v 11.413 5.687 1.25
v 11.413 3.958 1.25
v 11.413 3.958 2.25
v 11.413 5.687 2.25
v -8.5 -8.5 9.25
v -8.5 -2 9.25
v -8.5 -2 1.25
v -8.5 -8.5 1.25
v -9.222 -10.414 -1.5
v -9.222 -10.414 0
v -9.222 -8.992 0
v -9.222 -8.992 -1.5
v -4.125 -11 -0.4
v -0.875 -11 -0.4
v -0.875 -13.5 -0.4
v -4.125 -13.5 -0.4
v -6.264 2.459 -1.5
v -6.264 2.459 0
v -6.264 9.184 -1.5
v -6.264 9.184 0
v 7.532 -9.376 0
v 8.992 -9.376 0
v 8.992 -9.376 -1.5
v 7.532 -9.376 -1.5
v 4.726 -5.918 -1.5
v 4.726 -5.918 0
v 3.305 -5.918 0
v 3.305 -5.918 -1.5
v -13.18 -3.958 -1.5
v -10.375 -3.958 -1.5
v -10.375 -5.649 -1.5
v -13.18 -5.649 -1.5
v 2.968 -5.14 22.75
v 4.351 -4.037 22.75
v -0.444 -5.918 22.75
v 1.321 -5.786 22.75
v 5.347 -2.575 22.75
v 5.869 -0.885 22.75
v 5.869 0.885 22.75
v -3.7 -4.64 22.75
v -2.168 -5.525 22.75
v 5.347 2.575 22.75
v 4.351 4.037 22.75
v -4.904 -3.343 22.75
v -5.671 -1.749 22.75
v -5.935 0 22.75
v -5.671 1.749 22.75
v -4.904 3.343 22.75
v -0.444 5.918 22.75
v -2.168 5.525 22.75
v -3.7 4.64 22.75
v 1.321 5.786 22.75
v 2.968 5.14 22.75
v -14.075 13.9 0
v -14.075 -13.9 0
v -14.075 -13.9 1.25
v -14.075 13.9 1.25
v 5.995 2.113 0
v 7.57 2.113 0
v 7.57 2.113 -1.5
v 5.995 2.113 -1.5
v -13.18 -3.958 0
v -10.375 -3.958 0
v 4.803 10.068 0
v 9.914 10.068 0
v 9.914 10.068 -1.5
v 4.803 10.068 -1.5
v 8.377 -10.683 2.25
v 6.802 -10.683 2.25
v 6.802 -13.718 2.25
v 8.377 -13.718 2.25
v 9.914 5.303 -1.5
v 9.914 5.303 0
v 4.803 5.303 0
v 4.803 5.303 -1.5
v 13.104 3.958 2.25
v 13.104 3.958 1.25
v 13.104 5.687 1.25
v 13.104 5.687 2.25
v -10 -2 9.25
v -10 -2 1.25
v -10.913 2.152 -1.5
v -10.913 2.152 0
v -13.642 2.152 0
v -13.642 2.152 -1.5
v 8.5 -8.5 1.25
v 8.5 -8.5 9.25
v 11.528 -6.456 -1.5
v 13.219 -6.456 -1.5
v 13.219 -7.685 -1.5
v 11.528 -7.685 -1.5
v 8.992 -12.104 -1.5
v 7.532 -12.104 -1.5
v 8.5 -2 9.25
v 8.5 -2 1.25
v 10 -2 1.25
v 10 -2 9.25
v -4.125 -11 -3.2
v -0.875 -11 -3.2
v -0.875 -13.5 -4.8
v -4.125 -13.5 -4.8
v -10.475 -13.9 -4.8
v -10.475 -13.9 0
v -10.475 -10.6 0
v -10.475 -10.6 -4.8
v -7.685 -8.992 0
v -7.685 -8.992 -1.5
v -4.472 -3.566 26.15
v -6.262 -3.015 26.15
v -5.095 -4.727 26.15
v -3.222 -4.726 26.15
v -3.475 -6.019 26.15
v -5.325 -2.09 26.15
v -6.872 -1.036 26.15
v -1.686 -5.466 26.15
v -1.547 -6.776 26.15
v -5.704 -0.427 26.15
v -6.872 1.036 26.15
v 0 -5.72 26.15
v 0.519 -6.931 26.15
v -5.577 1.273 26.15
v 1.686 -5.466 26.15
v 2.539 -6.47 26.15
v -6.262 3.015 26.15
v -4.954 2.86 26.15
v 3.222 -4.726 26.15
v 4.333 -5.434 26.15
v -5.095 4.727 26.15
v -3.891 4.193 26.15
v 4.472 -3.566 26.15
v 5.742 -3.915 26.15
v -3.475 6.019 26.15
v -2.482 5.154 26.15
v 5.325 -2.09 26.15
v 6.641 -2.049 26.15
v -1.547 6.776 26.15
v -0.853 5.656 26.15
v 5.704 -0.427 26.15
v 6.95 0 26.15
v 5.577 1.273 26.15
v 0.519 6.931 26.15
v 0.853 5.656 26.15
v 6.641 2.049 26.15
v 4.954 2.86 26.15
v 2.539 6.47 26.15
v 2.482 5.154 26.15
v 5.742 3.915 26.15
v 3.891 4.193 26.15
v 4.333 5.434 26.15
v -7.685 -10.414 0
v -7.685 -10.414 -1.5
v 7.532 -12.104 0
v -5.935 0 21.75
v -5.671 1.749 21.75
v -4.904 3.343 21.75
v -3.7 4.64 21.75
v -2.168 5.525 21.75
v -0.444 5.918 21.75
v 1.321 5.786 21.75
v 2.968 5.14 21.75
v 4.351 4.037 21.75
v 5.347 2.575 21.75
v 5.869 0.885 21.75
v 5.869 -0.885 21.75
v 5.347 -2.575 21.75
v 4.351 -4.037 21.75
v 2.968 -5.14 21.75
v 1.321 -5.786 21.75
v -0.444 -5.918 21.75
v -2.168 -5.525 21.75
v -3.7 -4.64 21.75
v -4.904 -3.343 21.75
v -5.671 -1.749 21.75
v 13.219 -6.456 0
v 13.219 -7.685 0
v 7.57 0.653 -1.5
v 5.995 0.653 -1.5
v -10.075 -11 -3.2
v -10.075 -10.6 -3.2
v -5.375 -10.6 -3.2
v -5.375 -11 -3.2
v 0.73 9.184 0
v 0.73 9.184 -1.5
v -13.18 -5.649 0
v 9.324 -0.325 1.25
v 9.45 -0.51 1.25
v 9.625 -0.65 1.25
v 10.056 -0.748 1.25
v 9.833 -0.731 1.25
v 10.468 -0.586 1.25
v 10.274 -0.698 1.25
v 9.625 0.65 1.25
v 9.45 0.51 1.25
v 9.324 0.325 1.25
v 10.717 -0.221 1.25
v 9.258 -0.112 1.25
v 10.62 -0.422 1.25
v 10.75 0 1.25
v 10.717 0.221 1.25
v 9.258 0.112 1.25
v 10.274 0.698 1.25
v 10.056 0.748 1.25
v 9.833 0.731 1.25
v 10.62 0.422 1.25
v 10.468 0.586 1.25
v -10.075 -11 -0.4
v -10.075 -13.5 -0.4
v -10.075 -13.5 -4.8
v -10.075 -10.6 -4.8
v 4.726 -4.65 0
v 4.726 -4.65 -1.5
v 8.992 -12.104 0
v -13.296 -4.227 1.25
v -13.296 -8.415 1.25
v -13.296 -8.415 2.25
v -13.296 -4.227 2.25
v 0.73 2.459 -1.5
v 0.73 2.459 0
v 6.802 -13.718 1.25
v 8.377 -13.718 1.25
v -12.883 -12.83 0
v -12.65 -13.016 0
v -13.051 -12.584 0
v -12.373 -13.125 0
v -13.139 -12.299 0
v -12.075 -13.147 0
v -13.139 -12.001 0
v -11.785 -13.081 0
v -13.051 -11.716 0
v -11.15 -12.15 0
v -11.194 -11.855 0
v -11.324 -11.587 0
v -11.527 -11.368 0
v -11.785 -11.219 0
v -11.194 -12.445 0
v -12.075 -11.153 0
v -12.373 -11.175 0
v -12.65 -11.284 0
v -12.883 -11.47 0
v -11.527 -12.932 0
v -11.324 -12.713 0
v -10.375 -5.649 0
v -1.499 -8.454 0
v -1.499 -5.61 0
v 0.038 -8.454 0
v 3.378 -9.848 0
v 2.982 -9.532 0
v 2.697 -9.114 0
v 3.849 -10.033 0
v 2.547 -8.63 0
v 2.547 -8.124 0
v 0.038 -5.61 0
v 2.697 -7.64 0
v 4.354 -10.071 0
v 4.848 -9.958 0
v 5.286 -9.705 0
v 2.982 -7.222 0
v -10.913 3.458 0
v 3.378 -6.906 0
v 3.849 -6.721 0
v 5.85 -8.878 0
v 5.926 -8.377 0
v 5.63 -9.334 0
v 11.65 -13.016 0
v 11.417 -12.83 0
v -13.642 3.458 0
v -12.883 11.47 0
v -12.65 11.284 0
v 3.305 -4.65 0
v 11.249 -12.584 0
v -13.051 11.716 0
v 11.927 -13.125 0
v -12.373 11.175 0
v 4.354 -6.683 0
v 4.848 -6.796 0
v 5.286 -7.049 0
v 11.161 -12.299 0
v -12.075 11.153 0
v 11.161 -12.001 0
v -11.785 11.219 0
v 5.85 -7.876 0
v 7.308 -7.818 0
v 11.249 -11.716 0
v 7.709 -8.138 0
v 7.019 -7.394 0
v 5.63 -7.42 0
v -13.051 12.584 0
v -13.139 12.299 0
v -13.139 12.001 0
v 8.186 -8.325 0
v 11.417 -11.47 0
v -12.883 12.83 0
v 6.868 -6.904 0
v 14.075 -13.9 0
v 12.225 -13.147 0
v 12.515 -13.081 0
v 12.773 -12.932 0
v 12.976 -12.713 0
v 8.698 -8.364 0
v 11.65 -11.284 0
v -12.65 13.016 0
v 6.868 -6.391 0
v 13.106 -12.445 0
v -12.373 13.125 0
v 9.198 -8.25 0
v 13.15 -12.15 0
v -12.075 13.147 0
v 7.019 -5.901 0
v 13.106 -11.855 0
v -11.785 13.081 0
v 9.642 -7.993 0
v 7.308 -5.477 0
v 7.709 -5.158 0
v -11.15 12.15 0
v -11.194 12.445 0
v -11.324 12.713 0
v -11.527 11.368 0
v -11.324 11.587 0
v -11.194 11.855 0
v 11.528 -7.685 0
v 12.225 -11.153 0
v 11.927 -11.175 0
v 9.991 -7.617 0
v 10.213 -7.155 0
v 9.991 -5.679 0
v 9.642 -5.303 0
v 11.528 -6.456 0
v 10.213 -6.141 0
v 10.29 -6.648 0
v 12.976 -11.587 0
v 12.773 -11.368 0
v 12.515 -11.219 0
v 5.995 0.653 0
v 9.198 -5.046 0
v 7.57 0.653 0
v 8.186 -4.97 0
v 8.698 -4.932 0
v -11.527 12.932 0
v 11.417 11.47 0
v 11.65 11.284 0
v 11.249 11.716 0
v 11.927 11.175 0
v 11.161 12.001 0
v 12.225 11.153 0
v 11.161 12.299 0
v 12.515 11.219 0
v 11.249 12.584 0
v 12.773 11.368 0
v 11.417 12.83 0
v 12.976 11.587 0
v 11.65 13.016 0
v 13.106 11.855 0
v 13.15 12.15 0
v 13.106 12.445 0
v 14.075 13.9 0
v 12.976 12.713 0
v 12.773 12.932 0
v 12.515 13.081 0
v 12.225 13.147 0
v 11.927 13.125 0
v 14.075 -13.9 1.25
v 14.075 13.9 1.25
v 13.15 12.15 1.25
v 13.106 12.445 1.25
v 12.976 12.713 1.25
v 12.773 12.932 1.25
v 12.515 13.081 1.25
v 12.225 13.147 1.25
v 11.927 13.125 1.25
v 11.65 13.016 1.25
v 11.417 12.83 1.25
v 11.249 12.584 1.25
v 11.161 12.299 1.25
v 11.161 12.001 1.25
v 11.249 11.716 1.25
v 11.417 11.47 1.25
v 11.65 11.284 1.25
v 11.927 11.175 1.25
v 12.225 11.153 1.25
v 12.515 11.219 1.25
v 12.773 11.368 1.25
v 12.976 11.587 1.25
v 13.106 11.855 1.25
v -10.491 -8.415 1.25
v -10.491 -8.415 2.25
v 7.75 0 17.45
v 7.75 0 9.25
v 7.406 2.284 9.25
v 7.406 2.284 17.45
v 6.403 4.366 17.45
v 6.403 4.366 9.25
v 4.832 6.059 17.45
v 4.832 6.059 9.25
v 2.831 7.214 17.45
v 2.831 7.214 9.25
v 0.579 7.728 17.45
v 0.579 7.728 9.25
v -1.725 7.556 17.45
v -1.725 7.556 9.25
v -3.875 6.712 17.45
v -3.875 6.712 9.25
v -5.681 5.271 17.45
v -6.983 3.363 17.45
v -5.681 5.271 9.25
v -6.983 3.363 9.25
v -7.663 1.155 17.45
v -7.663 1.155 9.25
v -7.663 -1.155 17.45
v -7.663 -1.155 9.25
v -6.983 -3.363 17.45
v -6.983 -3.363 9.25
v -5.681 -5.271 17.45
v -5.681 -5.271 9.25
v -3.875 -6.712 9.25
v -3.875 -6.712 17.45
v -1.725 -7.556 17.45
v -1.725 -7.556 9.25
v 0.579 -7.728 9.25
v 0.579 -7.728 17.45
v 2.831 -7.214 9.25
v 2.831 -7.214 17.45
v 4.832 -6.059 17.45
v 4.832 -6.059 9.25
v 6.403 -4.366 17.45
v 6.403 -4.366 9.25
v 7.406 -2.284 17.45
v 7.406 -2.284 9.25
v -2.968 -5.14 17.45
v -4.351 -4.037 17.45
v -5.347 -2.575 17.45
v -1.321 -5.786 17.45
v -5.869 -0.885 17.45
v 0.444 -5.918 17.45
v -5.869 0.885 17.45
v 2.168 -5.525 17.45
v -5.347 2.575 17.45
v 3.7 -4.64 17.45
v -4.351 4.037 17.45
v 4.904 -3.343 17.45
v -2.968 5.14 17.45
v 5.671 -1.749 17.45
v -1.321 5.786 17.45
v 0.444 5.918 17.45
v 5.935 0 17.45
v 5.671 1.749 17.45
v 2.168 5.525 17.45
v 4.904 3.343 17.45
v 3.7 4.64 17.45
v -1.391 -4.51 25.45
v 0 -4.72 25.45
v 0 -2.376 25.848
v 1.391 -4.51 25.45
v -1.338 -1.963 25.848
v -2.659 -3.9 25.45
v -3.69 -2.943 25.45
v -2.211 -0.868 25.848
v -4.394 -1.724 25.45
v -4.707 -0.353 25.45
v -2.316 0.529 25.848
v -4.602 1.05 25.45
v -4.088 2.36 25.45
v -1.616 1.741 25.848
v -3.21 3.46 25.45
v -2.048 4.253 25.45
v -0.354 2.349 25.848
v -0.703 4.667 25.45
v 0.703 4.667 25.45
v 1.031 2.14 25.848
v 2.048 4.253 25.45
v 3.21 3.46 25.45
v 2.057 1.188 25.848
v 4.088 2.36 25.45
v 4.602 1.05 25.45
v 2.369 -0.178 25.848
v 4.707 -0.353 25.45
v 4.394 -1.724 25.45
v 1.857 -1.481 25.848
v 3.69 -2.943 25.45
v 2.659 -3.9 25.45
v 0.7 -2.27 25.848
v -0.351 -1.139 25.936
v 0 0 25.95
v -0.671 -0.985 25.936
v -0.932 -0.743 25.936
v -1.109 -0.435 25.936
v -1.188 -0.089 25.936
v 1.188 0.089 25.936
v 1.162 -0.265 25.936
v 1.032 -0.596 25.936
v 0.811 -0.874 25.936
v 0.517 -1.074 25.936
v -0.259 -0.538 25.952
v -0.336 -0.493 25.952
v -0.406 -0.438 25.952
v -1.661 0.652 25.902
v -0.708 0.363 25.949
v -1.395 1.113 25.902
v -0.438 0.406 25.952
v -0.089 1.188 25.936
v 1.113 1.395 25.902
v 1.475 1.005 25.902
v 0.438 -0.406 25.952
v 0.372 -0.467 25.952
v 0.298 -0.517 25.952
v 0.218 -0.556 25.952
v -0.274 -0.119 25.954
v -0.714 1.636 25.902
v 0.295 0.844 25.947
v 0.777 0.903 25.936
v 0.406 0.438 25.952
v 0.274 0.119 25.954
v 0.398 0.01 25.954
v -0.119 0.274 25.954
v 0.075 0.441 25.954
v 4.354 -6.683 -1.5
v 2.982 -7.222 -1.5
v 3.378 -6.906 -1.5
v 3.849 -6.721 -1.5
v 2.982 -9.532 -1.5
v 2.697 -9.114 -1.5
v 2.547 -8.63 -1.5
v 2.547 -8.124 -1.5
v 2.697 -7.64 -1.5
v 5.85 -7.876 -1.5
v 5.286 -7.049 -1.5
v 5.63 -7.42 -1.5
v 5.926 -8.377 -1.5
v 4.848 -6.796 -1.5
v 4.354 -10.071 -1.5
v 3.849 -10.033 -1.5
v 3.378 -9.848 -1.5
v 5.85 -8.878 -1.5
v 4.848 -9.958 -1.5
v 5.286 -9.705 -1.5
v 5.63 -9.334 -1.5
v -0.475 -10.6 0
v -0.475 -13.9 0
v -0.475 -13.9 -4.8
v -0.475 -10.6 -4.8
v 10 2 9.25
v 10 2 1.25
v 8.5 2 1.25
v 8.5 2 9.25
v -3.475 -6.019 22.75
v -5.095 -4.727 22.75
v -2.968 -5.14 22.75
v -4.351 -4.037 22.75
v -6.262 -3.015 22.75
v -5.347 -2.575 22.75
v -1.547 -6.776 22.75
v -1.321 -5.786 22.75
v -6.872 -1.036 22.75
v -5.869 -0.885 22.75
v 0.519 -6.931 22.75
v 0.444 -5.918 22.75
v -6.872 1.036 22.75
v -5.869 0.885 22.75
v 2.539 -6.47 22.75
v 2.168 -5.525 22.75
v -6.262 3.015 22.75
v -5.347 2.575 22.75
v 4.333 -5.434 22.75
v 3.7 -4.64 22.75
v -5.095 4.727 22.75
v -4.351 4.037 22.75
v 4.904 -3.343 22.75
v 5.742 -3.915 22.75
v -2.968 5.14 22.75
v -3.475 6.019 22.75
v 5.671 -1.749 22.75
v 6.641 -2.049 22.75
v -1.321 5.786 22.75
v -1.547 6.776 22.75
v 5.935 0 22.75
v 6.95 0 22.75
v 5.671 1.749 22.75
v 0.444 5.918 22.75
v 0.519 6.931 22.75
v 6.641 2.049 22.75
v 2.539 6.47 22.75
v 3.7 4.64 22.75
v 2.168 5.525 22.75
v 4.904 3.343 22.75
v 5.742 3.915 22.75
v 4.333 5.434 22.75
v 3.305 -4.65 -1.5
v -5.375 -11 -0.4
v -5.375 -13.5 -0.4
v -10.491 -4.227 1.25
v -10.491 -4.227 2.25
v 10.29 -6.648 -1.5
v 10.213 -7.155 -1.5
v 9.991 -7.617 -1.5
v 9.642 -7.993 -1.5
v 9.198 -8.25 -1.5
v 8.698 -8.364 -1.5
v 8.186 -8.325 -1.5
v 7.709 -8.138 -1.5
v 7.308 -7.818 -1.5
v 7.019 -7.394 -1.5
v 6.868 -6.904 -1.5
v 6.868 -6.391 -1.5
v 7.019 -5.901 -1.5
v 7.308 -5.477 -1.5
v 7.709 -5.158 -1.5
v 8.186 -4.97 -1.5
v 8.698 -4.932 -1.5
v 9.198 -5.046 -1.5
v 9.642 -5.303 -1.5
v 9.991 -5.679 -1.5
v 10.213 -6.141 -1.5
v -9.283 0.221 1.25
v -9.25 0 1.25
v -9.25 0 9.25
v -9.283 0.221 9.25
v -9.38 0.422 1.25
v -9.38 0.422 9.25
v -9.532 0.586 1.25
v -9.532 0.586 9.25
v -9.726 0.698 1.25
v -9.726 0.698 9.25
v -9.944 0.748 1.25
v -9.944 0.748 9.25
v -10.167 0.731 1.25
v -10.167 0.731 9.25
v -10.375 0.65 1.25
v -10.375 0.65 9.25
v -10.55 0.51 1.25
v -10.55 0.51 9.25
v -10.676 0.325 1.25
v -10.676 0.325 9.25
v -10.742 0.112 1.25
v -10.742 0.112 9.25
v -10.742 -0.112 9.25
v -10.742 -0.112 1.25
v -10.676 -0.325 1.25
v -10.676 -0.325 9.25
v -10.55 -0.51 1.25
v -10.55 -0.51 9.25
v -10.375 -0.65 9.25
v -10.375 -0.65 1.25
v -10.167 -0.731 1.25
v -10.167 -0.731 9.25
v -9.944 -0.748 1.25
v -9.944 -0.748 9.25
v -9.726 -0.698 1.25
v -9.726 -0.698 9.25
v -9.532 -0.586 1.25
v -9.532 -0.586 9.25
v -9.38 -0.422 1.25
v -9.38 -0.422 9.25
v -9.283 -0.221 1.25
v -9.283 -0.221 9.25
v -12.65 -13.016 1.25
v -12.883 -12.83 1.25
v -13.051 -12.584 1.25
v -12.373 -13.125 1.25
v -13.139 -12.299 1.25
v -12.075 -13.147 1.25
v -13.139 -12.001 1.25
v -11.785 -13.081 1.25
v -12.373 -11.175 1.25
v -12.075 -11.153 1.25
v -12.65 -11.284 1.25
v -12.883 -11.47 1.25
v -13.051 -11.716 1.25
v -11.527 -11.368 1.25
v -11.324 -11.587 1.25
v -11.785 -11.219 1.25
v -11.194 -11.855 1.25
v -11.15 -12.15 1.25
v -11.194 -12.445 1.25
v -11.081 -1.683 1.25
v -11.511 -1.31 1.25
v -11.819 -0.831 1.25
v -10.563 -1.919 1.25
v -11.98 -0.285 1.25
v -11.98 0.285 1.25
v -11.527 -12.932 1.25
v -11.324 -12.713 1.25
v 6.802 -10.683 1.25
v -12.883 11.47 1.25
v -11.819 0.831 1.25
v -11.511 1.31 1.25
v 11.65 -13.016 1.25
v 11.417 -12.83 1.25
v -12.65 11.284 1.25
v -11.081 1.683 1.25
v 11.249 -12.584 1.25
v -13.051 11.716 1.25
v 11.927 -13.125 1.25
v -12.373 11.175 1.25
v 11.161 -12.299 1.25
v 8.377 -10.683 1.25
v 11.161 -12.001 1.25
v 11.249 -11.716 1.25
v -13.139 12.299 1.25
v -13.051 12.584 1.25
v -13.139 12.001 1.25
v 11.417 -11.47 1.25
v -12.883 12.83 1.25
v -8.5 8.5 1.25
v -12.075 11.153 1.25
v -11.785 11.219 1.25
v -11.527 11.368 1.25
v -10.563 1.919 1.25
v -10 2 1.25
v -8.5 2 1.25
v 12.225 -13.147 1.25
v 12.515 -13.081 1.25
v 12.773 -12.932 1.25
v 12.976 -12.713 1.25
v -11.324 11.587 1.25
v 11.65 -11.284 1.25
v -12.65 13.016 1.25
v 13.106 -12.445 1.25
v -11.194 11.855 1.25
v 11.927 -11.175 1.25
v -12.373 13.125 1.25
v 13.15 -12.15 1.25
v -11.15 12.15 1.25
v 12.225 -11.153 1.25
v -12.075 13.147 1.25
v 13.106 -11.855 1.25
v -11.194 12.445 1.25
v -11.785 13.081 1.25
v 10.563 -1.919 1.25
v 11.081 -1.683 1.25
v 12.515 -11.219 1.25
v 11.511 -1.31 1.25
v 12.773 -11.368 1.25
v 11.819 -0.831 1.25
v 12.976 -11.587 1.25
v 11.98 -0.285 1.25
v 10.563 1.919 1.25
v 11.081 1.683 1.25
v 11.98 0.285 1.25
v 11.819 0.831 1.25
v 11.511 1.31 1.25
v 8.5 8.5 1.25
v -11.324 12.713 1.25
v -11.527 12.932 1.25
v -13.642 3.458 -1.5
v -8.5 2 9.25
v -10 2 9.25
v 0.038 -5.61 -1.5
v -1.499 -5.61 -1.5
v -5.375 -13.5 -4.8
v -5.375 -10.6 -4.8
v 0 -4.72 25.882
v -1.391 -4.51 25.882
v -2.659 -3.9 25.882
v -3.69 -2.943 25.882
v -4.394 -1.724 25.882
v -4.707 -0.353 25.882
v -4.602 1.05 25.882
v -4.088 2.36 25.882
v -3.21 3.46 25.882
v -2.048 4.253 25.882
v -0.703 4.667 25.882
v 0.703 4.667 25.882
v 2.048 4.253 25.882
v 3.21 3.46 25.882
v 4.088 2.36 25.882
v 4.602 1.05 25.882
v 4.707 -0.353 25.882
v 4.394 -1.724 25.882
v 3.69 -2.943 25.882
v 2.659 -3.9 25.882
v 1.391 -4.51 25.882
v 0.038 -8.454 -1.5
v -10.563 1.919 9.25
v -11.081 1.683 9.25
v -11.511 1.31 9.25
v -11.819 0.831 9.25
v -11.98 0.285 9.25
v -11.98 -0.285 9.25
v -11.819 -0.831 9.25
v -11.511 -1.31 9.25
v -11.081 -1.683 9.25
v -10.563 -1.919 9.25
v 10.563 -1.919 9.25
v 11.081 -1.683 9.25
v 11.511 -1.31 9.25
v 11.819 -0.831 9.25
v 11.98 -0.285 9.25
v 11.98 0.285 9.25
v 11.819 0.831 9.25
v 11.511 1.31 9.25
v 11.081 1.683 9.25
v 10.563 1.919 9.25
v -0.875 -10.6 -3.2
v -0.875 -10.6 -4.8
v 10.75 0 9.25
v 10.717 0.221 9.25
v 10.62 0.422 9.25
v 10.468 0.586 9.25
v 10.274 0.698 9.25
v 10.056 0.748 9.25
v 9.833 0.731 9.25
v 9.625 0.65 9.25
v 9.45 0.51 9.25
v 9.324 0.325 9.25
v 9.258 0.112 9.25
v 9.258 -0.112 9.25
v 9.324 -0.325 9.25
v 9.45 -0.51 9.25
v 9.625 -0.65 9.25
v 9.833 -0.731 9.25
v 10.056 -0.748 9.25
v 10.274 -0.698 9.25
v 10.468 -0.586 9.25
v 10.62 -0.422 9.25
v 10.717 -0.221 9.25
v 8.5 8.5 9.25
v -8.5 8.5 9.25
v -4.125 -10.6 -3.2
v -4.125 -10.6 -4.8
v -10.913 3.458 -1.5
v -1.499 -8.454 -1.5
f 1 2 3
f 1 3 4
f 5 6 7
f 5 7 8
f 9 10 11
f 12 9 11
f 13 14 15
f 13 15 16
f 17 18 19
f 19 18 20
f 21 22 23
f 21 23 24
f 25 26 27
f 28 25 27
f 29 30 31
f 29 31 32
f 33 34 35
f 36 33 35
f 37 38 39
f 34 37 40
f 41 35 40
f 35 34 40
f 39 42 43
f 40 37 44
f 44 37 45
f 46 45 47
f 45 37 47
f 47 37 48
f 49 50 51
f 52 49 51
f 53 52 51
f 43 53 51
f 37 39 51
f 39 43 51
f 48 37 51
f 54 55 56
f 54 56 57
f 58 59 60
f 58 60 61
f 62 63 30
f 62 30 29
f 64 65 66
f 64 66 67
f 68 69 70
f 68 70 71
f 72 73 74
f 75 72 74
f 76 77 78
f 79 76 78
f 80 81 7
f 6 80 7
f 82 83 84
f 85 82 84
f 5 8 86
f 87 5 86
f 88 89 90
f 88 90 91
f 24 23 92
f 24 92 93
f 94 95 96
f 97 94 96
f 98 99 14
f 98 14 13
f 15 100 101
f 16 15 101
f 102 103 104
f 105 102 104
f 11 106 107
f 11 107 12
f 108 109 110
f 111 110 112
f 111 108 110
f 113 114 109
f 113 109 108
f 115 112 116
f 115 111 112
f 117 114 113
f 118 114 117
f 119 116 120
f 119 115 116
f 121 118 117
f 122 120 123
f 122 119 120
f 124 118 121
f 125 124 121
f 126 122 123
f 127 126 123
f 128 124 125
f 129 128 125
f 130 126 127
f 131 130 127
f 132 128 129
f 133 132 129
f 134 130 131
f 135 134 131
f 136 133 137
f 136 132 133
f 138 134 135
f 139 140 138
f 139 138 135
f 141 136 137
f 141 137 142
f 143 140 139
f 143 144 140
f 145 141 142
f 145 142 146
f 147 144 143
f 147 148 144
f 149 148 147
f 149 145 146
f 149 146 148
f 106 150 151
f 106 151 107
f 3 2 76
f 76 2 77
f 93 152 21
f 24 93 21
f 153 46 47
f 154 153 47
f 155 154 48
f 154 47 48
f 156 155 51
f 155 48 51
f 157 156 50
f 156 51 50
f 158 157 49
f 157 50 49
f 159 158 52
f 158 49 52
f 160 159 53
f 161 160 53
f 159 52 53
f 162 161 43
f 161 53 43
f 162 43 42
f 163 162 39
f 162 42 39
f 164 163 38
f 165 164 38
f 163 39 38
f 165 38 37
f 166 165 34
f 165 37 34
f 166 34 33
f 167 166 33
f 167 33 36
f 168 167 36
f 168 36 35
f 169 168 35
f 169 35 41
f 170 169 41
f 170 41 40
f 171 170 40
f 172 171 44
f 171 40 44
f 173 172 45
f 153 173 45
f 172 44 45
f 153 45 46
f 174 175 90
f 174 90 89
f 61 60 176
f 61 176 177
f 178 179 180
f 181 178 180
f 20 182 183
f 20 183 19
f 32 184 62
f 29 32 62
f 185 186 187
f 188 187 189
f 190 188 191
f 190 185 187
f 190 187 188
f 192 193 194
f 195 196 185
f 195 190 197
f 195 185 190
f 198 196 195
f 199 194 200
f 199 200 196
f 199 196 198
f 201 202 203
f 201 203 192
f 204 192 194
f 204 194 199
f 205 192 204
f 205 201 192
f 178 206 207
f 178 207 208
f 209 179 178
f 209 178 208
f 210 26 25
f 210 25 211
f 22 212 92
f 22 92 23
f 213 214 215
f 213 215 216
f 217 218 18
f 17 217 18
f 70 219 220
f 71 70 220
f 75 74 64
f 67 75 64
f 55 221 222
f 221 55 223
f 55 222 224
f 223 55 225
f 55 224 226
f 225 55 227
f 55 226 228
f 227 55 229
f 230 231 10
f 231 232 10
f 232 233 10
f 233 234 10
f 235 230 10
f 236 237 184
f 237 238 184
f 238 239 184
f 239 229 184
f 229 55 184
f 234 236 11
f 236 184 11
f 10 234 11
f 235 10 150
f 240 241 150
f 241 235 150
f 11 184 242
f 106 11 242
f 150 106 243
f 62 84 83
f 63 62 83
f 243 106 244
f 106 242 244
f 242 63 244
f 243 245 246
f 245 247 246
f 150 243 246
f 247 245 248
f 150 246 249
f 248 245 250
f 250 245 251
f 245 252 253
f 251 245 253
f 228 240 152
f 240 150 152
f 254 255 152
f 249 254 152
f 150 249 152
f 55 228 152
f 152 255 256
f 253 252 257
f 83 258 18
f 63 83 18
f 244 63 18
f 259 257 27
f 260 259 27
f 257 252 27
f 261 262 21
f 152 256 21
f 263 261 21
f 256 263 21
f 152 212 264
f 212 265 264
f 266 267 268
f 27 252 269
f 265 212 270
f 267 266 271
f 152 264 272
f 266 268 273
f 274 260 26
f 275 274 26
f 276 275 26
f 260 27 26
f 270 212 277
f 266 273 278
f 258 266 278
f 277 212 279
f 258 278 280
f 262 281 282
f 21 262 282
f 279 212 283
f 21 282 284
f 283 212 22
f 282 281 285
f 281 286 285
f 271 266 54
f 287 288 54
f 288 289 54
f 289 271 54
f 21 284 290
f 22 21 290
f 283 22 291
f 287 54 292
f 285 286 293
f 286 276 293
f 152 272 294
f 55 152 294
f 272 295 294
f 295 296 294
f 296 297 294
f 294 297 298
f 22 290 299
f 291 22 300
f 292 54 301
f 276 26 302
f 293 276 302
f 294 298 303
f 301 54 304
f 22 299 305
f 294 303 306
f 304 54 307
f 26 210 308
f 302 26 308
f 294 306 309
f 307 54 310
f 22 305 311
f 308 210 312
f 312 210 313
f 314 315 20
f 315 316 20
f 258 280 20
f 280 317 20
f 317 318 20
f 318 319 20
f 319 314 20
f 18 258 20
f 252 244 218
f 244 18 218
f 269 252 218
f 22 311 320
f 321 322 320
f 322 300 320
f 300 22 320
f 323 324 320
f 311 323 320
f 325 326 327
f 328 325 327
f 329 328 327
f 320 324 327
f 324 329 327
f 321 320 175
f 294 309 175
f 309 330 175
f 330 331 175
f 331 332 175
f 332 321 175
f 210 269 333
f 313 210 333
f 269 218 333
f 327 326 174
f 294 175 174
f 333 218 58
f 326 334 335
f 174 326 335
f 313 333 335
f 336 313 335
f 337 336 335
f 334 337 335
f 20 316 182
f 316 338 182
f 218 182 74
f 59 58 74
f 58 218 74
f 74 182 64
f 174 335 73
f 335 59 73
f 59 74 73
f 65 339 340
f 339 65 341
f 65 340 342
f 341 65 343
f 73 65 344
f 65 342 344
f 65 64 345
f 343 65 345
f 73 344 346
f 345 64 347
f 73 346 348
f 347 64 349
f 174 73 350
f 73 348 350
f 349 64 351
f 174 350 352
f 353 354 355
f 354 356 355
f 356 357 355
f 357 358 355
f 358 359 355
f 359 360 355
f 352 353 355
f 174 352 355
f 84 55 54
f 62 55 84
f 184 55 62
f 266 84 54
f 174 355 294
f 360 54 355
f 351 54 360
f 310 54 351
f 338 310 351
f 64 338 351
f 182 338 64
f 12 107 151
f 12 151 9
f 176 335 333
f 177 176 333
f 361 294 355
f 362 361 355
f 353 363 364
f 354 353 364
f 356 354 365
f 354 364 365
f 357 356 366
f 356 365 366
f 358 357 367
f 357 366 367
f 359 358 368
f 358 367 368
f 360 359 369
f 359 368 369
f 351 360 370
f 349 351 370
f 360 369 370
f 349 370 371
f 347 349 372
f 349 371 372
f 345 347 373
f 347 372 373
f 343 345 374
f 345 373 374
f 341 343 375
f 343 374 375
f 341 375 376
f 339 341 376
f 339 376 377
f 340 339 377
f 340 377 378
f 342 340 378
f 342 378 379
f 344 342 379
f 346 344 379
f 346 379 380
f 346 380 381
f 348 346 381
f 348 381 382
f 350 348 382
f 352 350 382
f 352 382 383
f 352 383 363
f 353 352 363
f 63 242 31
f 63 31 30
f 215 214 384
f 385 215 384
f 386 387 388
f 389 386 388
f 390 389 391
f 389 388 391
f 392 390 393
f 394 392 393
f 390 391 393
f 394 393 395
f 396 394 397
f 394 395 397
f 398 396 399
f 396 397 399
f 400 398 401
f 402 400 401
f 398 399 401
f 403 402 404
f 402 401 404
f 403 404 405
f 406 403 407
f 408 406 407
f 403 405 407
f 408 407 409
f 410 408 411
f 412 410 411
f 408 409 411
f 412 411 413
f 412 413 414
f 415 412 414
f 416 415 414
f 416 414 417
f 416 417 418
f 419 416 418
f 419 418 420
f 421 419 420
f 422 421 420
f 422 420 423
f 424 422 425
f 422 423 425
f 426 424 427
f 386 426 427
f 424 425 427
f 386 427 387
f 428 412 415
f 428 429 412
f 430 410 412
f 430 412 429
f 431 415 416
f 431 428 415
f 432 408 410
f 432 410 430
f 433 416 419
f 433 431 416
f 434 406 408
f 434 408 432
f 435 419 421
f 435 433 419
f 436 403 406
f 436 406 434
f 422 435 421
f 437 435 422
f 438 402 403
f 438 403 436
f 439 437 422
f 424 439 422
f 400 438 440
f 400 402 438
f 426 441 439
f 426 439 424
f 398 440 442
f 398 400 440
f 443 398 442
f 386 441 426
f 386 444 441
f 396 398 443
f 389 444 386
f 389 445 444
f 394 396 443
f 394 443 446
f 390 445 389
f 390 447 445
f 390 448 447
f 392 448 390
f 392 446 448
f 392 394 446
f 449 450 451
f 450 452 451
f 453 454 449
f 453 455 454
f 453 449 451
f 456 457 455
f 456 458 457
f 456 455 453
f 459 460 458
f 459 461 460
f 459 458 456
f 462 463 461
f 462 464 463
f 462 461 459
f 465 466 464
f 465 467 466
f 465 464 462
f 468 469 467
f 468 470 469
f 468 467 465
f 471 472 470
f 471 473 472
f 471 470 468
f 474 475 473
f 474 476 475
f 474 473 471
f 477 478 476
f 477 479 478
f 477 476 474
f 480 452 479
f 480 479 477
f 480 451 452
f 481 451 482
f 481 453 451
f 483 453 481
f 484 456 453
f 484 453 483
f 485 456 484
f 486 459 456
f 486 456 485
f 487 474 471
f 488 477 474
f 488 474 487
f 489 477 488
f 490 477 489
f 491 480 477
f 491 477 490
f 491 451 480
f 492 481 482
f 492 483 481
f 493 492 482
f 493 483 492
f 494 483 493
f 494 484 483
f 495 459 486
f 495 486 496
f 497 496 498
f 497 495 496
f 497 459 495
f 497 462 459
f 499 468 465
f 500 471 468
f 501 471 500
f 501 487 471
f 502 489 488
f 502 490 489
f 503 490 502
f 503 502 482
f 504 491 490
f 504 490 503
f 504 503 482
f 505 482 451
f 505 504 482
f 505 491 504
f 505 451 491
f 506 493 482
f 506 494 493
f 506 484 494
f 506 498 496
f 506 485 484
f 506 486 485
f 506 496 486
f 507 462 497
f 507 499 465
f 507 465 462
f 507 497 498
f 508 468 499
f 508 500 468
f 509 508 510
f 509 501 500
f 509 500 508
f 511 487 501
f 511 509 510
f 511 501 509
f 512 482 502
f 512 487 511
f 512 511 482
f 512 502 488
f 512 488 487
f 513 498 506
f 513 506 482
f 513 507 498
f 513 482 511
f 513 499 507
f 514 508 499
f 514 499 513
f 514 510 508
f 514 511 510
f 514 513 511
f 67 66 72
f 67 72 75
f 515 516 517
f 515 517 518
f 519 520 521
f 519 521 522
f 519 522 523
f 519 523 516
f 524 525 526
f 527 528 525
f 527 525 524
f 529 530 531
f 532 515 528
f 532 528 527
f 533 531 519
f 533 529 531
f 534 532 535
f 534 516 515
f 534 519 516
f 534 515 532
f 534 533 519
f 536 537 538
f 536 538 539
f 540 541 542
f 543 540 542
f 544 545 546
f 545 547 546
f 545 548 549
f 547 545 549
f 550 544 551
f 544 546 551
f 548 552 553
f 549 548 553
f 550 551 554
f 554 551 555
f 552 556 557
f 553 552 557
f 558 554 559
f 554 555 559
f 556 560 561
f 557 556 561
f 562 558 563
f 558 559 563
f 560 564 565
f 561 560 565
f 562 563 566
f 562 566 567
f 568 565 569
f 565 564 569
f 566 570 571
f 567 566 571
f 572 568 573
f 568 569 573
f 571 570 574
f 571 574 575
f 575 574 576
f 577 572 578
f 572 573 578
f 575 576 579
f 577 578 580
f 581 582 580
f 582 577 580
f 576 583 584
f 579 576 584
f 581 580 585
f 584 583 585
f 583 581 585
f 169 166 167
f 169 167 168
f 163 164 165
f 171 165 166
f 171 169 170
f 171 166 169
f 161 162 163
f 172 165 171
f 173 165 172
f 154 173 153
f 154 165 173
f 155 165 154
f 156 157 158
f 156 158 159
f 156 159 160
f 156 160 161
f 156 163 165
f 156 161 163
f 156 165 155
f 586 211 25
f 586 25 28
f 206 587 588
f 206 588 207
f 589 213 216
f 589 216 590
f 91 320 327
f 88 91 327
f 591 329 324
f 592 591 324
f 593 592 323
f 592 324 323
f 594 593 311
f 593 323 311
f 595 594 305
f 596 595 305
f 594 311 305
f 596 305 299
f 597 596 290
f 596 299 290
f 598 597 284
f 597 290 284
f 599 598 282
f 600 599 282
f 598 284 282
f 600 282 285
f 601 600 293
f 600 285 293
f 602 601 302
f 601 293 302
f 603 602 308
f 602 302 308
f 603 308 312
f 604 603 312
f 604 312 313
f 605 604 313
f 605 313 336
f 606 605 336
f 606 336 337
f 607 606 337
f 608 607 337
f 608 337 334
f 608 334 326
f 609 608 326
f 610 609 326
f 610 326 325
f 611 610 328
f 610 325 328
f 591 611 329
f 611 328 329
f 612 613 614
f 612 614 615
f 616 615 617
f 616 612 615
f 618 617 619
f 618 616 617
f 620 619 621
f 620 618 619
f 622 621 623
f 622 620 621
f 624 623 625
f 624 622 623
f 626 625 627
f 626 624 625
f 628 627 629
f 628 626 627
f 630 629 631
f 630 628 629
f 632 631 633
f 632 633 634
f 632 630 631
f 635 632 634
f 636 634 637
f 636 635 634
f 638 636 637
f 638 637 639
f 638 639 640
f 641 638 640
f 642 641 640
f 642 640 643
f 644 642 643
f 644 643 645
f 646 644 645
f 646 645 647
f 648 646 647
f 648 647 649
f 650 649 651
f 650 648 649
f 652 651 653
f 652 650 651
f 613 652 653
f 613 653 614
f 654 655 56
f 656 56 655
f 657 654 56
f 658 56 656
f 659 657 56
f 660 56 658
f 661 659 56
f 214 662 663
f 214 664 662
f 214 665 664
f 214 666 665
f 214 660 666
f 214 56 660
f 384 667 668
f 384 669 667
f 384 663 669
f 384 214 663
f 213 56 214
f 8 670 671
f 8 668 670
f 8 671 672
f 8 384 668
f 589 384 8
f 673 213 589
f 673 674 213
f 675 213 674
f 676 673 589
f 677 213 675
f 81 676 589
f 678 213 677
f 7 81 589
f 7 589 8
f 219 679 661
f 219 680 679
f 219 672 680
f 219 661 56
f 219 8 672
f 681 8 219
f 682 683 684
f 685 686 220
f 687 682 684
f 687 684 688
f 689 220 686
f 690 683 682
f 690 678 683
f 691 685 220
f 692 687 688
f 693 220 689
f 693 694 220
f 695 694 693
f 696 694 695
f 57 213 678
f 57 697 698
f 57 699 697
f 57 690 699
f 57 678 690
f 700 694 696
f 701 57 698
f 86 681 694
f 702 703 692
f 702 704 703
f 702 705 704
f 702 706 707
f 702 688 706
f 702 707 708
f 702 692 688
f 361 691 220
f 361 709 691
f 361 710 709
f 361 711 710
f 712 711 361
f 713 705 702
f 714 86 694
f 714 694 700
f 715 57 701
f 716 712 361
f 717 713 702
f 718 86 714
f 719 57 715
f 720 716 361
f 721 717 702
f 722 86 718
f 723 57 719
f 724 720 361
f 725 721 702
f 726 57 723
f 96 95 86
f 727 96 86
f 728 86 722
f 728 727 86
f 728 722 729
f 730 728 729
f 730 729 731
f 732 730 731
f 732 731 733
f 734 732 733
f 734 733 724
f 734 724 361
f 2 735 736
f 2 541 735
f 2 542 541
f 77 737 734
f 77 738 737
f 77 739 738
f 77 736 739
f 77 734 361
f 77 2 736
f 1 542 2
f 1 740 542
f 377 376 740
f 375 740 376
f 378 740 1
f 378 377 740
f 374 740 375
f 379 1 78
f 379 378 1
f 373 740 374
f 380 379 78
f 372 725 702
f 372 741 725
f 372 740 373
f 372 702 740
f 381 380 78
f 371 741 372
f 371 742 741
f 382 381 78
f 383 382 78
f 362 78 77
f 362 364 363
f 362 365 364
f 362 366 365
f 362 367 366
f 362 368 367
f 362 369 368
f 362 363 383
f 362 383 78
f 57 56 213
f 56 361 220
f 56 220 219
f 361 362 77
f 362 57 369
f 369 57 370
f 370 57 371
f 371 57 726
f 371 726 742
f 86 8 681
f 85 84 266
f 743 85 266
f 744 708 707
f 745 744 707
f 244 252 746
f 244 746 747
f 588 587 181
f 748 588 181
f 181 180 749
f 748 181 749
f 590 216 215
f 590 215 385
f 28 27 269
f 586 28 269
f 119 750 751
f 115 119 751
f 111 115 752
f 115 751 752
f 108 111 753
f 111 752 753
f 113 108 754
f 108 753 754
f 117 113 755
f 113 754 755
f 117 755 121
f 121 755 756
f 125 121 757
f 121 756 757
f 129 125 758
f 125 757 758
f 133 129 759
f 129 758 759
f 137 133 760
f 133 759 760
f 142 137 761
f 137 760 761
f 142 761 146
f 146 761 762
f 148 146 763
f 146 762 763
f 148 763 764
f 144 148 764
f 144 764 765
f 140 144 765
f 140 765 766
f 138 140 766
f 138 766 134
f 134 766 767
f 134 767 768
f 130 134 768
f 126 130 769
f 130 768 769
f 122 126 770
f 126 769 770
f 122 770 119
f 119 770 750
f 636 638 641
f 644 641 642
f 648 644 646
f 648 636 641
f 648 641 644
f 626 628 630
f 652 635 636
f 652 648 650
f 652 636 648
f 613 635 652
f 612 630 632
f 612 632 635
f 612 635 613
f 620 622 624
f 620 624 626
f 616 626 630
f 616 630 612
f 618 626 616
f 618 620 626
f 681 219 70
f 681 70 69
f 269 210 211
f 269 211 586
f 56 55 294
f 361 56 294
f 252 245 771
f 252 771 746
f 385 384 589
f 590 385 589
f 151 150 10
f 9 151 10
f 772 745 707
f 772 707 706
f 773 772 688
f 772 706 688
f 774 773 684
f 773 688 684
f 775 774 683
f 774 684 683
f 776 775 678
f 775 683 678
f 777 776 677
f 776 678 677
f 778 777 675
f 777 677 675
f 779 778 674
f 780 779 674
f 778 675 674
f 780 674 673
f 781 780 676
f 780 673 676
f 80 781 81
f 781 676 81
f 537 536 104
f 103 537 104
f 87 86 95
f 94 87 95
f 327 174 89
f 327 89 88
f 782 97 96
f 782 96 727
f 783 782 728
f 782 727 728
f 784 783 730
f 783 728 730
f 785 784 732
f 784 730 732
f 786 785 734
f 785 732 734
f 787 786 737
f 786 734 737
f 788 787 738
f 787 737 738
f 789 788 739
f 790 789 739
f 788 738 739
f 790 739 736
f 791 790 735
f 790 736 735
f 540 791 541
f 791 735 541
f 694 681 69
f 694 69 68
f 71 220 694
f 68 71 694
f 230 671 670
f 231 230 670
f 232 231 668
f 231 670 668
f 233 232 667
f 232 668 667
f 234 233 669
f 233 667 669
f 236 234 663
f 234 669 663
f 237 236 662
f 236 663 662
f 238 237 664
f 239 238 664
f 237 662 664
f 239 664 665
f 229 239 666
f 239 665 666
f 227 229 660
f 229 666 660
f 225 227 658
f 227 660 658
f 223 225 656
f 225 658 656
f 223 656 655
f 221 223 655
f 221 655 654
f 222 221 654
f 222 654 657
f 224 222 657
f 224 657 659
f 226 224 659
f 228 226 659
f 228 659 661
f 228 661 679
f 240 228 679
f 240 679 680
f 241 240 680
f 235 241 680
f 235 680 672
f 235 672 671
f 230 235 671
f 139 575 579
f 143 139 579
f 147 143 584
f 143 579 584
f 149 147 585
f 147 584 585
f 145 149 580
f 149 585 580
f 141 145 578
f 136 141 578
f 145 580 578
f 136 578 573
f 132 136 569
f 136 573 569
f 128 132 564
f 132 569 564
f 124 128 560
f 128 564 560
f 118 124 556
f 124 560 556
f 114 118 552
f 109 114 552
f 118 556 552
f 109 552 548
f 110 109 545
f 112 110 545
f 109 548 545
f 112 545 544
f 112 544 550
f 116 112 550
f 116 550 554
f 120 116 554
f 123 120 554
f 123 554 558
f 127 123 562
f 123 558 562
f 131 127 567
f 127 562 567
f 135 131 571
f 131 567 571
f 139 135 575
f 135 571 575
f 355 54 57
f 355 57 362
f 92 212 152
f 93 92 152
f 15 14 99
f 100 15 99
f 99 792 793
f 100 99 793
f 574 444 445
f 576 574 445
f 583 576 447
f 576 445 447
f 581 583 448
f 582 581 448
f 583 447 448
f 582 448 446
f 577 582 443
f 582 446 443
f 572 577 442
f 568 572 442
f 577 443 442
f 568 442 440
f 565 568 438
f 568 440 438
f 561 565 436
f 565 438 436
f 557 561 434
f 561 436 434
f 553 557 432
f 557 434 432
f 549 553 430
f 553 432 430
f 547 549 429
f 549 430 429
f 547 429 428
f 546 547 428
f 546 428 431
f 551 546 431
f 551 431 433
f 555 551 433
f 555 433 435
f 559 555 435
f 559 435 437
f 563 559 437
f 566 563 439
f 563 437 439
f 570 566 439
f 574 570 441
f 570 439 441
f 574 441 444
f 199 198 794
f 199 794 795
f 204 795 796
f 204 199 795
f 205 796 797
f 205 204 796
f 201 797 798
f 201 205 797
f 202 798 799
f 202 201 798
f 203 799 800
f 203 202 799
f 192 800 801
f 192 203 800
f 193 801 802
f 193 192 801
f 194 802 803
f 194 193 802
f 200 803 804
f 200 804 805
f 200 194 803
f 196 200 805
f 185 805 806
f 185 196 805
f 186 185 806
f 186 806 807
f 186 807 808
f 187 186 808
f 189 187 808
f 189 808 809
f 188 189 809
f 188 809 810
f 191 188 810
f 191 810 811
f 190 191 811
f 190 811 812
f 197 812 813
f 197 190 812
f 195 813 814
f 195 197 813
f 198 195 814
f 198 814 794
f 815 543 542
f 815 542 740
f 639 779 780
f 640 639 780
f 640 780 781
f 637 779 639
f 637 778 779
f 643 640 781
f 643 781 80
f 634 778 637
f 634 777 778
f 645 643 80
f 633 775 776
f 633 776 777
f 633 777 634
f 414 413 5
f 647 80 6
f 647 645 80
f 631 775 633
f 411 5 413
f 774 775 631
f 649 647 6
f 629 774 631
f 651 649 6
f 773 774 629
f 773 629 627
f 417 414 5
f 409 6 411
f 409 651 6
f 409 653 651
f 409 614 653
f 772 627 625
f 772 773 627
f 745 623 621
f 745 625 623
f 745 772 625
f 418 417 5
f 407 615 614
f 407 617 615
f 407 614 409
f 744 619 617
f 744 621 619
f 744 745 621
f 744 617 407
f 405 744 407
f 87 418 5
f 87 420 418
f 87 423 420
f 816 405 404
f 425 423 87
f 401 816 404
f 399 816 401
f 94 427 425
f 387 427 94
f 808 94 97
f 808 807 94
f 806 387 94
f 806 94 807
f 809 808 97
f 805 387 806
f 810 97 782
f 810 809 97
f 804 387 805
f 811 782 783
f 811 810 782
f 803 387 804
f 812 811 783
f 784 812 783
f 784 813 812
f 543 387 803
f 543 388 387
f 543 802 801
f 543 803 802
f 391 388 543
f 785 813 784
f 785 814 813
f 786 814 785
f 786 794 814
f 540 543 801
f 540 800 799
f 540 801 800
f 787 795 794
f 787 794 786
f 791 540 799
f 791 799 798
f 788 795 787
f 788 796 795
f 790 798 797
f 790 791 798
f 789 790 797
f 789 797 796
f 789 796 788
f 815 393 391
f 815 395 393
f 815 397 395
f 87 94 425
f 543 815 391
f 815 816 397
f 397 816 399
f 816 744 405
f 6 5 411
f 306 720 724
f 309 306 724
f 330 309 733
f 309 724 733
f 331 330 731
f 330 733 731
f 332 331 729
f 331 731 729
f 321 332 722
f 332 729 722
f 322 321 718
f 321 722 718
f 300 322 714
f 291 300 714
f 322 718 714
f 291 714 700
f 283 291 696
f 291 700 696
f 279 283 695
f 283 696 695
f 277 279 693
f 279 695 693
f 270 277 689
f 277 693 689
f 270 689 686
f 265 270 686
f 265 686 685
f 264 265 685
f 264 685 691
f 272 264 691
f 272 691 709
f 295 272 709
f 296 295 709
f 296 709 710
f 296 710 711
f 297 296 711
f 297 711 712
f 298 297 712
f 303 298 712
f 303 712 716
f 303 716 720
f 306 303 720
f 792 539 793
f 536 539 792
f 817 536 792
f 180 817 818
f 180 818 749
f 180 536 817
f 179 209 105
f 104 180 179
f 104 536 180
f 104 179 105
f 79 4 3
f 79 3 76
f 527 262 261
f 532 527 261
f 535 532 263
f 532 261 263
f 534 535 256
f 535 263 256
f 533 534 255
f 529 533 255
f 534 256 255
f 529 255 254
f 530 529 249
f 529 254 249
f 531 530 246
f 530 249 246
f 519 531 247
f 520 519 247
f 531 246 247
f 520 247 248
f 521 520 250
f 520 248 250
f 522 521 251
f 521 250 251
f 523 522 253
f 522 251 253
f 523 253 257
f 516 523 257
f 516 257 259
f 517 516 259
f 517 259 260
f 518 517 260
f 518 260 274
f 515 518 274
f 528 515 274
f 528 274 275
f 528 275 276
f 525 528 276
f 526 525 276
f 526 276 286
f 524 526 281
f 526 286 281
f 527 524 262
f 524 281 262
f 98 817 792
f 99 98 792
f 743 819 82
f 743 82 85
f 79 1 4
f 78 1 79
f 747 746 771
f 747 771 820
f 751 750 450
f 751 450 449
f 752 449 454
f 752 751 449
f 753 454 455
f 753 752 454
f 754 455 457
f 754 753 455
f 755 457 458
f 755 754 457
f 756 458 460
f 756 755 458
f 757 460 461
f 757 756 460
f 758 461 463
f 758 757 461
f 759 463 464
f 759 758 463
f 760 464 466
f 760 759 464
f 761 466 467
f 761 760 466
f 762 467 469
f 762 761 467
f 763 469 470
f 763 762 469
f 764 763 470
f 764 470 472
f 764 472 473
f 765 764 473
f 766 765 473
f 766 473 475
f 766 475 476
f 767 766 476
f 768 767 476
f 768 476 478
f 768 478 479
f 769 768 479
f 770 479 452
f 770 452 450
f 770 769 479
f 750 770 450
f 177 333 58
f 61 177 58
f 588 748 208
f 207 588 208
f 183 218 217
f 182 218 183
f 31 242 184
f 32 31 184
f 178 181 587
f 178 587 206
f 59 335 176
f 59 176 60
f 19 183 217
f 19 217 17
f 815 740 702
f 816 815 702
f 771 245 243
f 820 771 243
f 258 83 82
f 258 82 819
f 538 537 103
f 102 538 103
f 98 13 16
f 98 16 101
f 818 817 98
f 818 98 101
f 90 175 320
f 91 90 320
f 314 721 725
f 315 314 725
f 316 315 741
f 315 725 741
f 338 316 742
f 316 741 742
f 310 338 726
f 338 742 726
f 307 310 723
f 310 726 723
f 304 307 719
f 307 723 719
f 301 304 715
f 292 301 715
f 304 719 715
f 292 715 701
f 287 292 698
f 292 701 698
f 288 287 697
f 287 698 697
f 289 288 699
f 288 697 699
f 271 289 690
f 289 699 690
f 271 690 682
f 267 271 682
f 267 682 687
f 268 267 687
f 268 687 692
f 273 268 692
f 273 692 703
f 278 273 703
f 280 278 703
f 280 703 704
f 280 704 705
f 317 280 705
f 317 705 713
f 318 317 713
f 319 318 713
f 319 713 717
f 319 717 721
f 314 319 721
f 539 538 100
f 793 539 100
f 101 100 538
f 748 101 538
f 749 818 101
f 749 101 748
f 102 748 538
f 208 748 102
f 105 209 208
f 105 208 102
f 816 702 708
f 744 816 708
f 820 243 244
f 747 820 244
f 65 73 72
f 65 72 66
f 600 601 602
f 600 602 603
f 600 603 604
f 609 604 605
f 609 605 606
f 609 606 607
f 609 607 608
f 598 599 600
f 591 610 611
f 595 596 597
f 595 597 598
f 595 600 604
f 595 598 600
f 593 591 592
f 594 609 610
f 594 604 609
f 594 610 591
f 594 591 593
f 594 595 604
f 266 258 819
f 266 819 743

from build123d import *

# Parameters (mm, degrees)
SKETCH1_W              = 28.15
SKETCH1_H              = 27.8
BASE_SHAPE_DEPTH       = 1.25
MOUNTING_HOLES_REACH   = 21.821
SKETCH2_R              = 1
SKETCH3_R              = 0.75
CAM_BASE_DEPTH         = 8
SKETCH4_R              = 7.75
CAM_STEP_1_DEPTH       = 8.2
SKETCH5_R              = 5.935
CAM_STEP_2_DEPTH       = 5.3
SKETCH6_R              = 6.95
CAM_STEP_3_DEPTH       = 3.4
LENS_CHAMFER_SIZE      = 1
LENS_CHAMFER_SIZE2     = 0.267949192
SKETCH8_R              = 5.935
LENS_BACKGROUND_DEPTH  = 1
SKETCH9_W              = 2.805155133
SKETCH9_H              = 4.188519308
SKETCH9_W_2            = 1.575498088
SKETCH9_H_2            = 3.035715829
SKETCH9_W_3            = 1.690778436
SKETCH9_H_3            = 1.729205218
FRONT_COMPONENTS_DEPTH = 1
SKETCH10_R             = 1.720644744
SKETCH10_R_2           = 1.698620275
SKETCH10_W             = 5.110762091
SKETCH10_H             = 4.764921047
SKETCH10_W_2           = 1.575498088
SKETCH10_H_2           = 1.46021774
SKETCH10_W_3           = 1.690778437
SKETCH10_H_3           = 1.229657045
SKETCH10_W_4           = 1.46021774
SKETCH10_H_4           = 2.728301567
SKETCH10_W_5           = 1.421790957
SKETCH10_H_5           = 1.268083827
SKETCH10_W_6           = 1.537071306
SKETCH10_H_6           = 2.843581915
SKETCH10_W_7           = 2.805155133
SKETCH10_H_7           = 1.690778436
SKETCH10_W_8           = 2.728301568
SKETCH10_H_8           = 1.306510609
SKETCH10_W_9           = 1.537071305
SKETCH10_H_9           = 1.421790958
SKETCH10_W_10          = 6.99367444
SKETCH10_H_10          = 6.724686962
REAR_COMPONENTS_DEPTH  = 1.5
SKETCH11_W             = 10
SKETCH11_H             = 3.3
BOSS_EXTRUDE9_DEPTH    = 4.8
SKETCH12_W             = 3.25
SKETCH12_H             = 2.5
SKETCH12_W_2           = 4.7
CUT_EXTRUDE2_DEPTH     = 4.4
SKETCH13_W             = 3.25
SKETCH13_H             = 1.6
SKETCH13_W_2           = 4.7
CUT_EXTRUDE3_DEPTH     = 0.4


with BuildPart() as part:
    # Sketch1 → Base shape (new body)
    with BuildSketch(Plane.XY):
        Rectangle(SKETCH1_W, SKETCH1_H)
    extrude(amount=BASE_SHAPE_DEPTH)

    # Sketch2 → Mounting holes (cut, up to next)
    with BuildSketch(Plane.XY.offset(1.25), mode=Mode.PRIVATE) as mounting_holes_sk1:
        with Locations((12.15, 12.15)):
            Circle(SKETCH2_R)
    mounting_holes_tool1 = extrude(mounting_holes_sk1.sketch, amount=-MOUNTING_HOLES_REACH, mode=Mode.PRIVATE) & part.part
    # Sketch2 → Mounting holes (cut, up to next)
    with BuildSketch(Plane.XY.offset(1.25), mode=Mode.PRIVATE) as mounting_holes_sk2:
        with Locations((-12.15, 12.15)):
            Circle(SKETCH2_R)
    mounting_holes_tool2 = extrude(mounting_holes_sk2.sketch, amount=-MOUNTING_HOLES_REACH, mode=Mode.PRIVATE) & part.part
    # Sketch2 → Mounting holes (cut, up to next)
    with BuildSketch(Plane.XY.offset(1.25), mode=Mode.PRIVATE) as mounting_holes_sk3:
        with Locations((12.15, -12.15)):
            Circle(SKETCH2_R)
    mounting_holes_tool3 = extrude(mounting_holes_sk3.sketch, amount=-MOUNTING_HOLES_REACH, mode=Mode.PRIVATE) & part.part
    # Sketch2 → Mounting holes (cut, up to next)
    with BuildSketch(Plane.XY.offset(1.25), mode=Mode.PRIVATE) as mounting_holes_sk4:
        with Locations((-12.15, -12.15)):
            Circle(SKETCH2_R)
    mounting_holes_tool4 = extrude(mounting_holes_sk4.sketch, amount=-MOUNTING_HOLES_REACH, mode=Mode.PRIVATE) & part.part
    add(mounting_holes_tool1.solids().sort_by_distance((12.15, 12.15, 1.25))[0], mode=Mode.SUBTRACT)
    add(mounting_holes_tool2.solids().sort_by_distance((-12.15, 12.15, 1.25))[0], mode=Mode.SUBTRACT)
    add(mounting_holes_tool3.solids().sort_by_distance((12.15, -12.15, 1.25))[0], mode=Mode.SUBTRACT)
    add(mounting_holes_tool4.solids().sort_by_distance((-12.15, -12.15, 1.25))[0], mode=Mode.SUBTRACT)

    # Sketch3 → Cam base (add)
    with BuildSketch(Plane.XY.offset(1.25)):
        with BuildLine():
            Line((8.5, -8.5), (8.5, -2))
            Line((8.5, -2), (10, -2))
            ThreePointArc((10, -2), (12, 0), (10, 2))
            Line((10, 2), (8.5, 2))
            Line((8.5, 2), (8.5, 8.5))
            Line((8.5, 8.5), (-8.5, 8.5))
            Line((-8.5, 8.5), (-8.5, 2))
            Line((-8.5, 2), (-10, 2))
            ThreePointArc((-10, 2), (-12, 0), (-10, -2))
            Line((-10, -2), (-8.5, -2))
            Line((-8.5, -2), (-8.5, -8.5))
            Line((-8.5, -8.5), (8.5, -8.5))
        make_face()
        with Locations((-10, 0)):
            Circle(SKETCH3_R, mode=Mode.SUBTRACT)
        with Locations((10, 0)):
            Circle(SKETCH3_R, mode=Mode.SUBTRACT)
    extrude(amount=CAM_BASE_DEPTH)

    # Sketch4 → Cam step 1 (add)
    with BuildSketch(Plane.XY.offset(9.25)):
        Circle(SKETCH4_R)
    extrude(amount=CAM_STEP_1_DEPTH)

    # Sketch5 → Cam step 2 (add)
    with BuildSketch(Plane.XY.offset(17.45)):
        Circle(SKETCH5_R)
    extrude(amount=CAM_STEP_2_DEPTH)

    # Sketch6 → Cam step 3 (add)
    with BuildSketch(Plane.XY.offset(22.75)):
        Circle(SKETCH6_R)
    extrude(amount=CAM_STEP_3_DEPTH)

    # Sketch7 → Lens profile (revolve, cut)
    with BuildSketch(Plane(origin=(0, 0, 0), x_dir=(0, 0, -1), z_dir=(1, 0, 0)), mode=Mode.PRIVATE) as lens_profile_sk:
        with BuildLine():
            Line((-25.45, 4.72), (-26.15, 4.72))
            Line((-26.15, 4.72), (-26.15, 0))
            Line((-26.15, 0), (-25.95, 0))
            add(Edge.make_bspline(
                [(-25.95, 0), (-25.99669702, 2.391304703), (-25.45, 4.72)],
                knots=[0, 0, 0, 1, 1, 1], degree=2))
        make_face()
    revolve(lens_profile_sk.sketch.rotate(Axis((0, 0, 26.15), (0, 0, -1)), 180), axis=Axis((0, 0, 26.15), (0, 0, -1)), mode=Mode.SUBTRACT)

    # Lens chamfer
    lens_chamfer_edges = [part.edges().sort_by_distance(p)[0] for p in [
        (0, 4.72, 26.15),
    ]]
    lens_chamfer_side = [part.faces().sort_by_distance(p)[0] for p in [
        (-6.753424315, 0, 26.15),
    ]]
    chamfer(lens_chamfer_edges, length=LENS_CHAMFER_SIZE, length2=LENS_CHAMFER_SIZE2, reference=lens_chamfer_side[0])

    # Sketch9 → Front components (add)
    with BuildSketch(Plane.XY.offset(1.25)):
        with Locations((-11.893089227, -6.321205744)):
            Rectangle(SKETCH9_W, SKETCH9_H)
        with Locations((7.589289571, -12.200503488)):
            Rectangle(SKETCH9_W_2, SKETCH9_H_2)
        with Locations((12.258143662, 4.822561221)):
            Rectangle(SKETCH9_W_3, SKETCH9_H_3)
    extrude(amount=FRONT_COMPONENTS_DEPTH)

    # Sketch10 → Rear components (add)
    with BuildSketch(Plane(origin=(0, 0, 0), x_dir=(-1, 0, 0), z_dir=(0, 0, -1))):
        with Locations(Location((-8.569172528, -6.647833396, 0), (0, 0, 180))):
            Circle(SKETCH10_R)
        with Locations(Location((-4.22694609, -8.377038615, 0), (0, 0, 180))):
            Circle(SKETCH10_R_2)
        with Locations((-7.358728876, 7.685356527)):
            Rectangle(SKETCH10_W, SKETCH10_H)
        with Locations((-6.782327136, 1.383364175)):
            Rectangle(SKETCH10_W_2, SKETCH10_H_2)
        with Locations((-12.37342401, -7.070528005)):
            Rectangle(SKETCH10_W_3, SKETCH10_H_3)
        with Locations((-8.261758267, -10.740285747)):
            Rectangle(SKETCH10_W_4, SKETCH10_H_4)
        with Locations((-4.015598785, -5.283682612)):
            Rectangle(SKETCH10_W_5, SKETCH10_H_5)
        with Locations((0.73010887, -7.032101223)):
            Rectangle(SKETCH10_W_6, SKETCH10_H_6)
        with Locations((11.777808879, -4.80334783)):
            Rectangle(SKETCH10_W_7, SKETCH10_H_7)
        with Locations((12.277357053, 2.805155133)):
            Rectangle(SKETCH10_W_8, SKETCH10_H_8)
        with Locations((8.453892181, -9.702762616)):
            Rectangle(SKETCH10_W_9, SKETCH10_H_9)
        with Locations((2.76672835, 5.82165757)):
            Rectangle(SKETCH10_W_10, SKETCH10_H_10)
    extrude(amount=REAR_COMPONENTS_DEPTH)


with BuildPart() as body_2:
    # Sketch8 → Lens background (new body)
    with BuildSketch(Plane(origin=(0, 0, 22.75), x_dir=(-1, 0, 0), z_dir=(0, 0, -1))):
        Circle(SKETCH8_R)
    extrude(amount=LENS_BACKGROUND_DEPTH)


with BuildPart() as body_3:
    # Sketch11 → Boss-Extrude9 (new body)
    with BuildSketch(Plane(origin=(0, 0, 0), x_dir=(-1, 0, 0), z_dir=(0, 0, -1))):
        with Locations((5.475, -12.25)):
            Rectangle(SKETCH11_W, SKETCH11_H)
    extrude(amount=BOSS_EXTRUDE9_DEPTH)

    # Sketch12 → Cut-Extrude2 (cut)
    with BuildSketch(Plane(origin=(0, 0, -4.8), x_dir=(-1, 0, 0), z_dir=(0, 0, -1))):
        with Locations((2.5, -12.25)):
            Rectangle(SKETCH12_W, SKETCH12_H)
        with Locations((7.725, -12.25)):
            Rectangle(SKETCH12_W_2, SKETCH12_H)
    extrude(amount=-CUT_EXTRUDE2_DEPTH, mode=Mode.SUBTRACT)

    # Sketch13 → Cut-Extrude3 (cut)
    with BuildSketch(Plane(origin=(0, -10.6, 0), x_dir=(1, 0, 0), z_dir=(0, 1, 0))):
        with Locations((-2.5, 4)):
            Rectangle(SKETCH13_W, SKETCH13_H)
        with Locations((-7.725, 4)):
            Rectangle(SKETCH13_W_2, SKETCH13_H)
    extrude(amount=-CUT_EXTRUDE3_DEPTH, mode=Mode.SUBTRACT)


solid = Compound([part.part, body_2.part, body_3.part])
